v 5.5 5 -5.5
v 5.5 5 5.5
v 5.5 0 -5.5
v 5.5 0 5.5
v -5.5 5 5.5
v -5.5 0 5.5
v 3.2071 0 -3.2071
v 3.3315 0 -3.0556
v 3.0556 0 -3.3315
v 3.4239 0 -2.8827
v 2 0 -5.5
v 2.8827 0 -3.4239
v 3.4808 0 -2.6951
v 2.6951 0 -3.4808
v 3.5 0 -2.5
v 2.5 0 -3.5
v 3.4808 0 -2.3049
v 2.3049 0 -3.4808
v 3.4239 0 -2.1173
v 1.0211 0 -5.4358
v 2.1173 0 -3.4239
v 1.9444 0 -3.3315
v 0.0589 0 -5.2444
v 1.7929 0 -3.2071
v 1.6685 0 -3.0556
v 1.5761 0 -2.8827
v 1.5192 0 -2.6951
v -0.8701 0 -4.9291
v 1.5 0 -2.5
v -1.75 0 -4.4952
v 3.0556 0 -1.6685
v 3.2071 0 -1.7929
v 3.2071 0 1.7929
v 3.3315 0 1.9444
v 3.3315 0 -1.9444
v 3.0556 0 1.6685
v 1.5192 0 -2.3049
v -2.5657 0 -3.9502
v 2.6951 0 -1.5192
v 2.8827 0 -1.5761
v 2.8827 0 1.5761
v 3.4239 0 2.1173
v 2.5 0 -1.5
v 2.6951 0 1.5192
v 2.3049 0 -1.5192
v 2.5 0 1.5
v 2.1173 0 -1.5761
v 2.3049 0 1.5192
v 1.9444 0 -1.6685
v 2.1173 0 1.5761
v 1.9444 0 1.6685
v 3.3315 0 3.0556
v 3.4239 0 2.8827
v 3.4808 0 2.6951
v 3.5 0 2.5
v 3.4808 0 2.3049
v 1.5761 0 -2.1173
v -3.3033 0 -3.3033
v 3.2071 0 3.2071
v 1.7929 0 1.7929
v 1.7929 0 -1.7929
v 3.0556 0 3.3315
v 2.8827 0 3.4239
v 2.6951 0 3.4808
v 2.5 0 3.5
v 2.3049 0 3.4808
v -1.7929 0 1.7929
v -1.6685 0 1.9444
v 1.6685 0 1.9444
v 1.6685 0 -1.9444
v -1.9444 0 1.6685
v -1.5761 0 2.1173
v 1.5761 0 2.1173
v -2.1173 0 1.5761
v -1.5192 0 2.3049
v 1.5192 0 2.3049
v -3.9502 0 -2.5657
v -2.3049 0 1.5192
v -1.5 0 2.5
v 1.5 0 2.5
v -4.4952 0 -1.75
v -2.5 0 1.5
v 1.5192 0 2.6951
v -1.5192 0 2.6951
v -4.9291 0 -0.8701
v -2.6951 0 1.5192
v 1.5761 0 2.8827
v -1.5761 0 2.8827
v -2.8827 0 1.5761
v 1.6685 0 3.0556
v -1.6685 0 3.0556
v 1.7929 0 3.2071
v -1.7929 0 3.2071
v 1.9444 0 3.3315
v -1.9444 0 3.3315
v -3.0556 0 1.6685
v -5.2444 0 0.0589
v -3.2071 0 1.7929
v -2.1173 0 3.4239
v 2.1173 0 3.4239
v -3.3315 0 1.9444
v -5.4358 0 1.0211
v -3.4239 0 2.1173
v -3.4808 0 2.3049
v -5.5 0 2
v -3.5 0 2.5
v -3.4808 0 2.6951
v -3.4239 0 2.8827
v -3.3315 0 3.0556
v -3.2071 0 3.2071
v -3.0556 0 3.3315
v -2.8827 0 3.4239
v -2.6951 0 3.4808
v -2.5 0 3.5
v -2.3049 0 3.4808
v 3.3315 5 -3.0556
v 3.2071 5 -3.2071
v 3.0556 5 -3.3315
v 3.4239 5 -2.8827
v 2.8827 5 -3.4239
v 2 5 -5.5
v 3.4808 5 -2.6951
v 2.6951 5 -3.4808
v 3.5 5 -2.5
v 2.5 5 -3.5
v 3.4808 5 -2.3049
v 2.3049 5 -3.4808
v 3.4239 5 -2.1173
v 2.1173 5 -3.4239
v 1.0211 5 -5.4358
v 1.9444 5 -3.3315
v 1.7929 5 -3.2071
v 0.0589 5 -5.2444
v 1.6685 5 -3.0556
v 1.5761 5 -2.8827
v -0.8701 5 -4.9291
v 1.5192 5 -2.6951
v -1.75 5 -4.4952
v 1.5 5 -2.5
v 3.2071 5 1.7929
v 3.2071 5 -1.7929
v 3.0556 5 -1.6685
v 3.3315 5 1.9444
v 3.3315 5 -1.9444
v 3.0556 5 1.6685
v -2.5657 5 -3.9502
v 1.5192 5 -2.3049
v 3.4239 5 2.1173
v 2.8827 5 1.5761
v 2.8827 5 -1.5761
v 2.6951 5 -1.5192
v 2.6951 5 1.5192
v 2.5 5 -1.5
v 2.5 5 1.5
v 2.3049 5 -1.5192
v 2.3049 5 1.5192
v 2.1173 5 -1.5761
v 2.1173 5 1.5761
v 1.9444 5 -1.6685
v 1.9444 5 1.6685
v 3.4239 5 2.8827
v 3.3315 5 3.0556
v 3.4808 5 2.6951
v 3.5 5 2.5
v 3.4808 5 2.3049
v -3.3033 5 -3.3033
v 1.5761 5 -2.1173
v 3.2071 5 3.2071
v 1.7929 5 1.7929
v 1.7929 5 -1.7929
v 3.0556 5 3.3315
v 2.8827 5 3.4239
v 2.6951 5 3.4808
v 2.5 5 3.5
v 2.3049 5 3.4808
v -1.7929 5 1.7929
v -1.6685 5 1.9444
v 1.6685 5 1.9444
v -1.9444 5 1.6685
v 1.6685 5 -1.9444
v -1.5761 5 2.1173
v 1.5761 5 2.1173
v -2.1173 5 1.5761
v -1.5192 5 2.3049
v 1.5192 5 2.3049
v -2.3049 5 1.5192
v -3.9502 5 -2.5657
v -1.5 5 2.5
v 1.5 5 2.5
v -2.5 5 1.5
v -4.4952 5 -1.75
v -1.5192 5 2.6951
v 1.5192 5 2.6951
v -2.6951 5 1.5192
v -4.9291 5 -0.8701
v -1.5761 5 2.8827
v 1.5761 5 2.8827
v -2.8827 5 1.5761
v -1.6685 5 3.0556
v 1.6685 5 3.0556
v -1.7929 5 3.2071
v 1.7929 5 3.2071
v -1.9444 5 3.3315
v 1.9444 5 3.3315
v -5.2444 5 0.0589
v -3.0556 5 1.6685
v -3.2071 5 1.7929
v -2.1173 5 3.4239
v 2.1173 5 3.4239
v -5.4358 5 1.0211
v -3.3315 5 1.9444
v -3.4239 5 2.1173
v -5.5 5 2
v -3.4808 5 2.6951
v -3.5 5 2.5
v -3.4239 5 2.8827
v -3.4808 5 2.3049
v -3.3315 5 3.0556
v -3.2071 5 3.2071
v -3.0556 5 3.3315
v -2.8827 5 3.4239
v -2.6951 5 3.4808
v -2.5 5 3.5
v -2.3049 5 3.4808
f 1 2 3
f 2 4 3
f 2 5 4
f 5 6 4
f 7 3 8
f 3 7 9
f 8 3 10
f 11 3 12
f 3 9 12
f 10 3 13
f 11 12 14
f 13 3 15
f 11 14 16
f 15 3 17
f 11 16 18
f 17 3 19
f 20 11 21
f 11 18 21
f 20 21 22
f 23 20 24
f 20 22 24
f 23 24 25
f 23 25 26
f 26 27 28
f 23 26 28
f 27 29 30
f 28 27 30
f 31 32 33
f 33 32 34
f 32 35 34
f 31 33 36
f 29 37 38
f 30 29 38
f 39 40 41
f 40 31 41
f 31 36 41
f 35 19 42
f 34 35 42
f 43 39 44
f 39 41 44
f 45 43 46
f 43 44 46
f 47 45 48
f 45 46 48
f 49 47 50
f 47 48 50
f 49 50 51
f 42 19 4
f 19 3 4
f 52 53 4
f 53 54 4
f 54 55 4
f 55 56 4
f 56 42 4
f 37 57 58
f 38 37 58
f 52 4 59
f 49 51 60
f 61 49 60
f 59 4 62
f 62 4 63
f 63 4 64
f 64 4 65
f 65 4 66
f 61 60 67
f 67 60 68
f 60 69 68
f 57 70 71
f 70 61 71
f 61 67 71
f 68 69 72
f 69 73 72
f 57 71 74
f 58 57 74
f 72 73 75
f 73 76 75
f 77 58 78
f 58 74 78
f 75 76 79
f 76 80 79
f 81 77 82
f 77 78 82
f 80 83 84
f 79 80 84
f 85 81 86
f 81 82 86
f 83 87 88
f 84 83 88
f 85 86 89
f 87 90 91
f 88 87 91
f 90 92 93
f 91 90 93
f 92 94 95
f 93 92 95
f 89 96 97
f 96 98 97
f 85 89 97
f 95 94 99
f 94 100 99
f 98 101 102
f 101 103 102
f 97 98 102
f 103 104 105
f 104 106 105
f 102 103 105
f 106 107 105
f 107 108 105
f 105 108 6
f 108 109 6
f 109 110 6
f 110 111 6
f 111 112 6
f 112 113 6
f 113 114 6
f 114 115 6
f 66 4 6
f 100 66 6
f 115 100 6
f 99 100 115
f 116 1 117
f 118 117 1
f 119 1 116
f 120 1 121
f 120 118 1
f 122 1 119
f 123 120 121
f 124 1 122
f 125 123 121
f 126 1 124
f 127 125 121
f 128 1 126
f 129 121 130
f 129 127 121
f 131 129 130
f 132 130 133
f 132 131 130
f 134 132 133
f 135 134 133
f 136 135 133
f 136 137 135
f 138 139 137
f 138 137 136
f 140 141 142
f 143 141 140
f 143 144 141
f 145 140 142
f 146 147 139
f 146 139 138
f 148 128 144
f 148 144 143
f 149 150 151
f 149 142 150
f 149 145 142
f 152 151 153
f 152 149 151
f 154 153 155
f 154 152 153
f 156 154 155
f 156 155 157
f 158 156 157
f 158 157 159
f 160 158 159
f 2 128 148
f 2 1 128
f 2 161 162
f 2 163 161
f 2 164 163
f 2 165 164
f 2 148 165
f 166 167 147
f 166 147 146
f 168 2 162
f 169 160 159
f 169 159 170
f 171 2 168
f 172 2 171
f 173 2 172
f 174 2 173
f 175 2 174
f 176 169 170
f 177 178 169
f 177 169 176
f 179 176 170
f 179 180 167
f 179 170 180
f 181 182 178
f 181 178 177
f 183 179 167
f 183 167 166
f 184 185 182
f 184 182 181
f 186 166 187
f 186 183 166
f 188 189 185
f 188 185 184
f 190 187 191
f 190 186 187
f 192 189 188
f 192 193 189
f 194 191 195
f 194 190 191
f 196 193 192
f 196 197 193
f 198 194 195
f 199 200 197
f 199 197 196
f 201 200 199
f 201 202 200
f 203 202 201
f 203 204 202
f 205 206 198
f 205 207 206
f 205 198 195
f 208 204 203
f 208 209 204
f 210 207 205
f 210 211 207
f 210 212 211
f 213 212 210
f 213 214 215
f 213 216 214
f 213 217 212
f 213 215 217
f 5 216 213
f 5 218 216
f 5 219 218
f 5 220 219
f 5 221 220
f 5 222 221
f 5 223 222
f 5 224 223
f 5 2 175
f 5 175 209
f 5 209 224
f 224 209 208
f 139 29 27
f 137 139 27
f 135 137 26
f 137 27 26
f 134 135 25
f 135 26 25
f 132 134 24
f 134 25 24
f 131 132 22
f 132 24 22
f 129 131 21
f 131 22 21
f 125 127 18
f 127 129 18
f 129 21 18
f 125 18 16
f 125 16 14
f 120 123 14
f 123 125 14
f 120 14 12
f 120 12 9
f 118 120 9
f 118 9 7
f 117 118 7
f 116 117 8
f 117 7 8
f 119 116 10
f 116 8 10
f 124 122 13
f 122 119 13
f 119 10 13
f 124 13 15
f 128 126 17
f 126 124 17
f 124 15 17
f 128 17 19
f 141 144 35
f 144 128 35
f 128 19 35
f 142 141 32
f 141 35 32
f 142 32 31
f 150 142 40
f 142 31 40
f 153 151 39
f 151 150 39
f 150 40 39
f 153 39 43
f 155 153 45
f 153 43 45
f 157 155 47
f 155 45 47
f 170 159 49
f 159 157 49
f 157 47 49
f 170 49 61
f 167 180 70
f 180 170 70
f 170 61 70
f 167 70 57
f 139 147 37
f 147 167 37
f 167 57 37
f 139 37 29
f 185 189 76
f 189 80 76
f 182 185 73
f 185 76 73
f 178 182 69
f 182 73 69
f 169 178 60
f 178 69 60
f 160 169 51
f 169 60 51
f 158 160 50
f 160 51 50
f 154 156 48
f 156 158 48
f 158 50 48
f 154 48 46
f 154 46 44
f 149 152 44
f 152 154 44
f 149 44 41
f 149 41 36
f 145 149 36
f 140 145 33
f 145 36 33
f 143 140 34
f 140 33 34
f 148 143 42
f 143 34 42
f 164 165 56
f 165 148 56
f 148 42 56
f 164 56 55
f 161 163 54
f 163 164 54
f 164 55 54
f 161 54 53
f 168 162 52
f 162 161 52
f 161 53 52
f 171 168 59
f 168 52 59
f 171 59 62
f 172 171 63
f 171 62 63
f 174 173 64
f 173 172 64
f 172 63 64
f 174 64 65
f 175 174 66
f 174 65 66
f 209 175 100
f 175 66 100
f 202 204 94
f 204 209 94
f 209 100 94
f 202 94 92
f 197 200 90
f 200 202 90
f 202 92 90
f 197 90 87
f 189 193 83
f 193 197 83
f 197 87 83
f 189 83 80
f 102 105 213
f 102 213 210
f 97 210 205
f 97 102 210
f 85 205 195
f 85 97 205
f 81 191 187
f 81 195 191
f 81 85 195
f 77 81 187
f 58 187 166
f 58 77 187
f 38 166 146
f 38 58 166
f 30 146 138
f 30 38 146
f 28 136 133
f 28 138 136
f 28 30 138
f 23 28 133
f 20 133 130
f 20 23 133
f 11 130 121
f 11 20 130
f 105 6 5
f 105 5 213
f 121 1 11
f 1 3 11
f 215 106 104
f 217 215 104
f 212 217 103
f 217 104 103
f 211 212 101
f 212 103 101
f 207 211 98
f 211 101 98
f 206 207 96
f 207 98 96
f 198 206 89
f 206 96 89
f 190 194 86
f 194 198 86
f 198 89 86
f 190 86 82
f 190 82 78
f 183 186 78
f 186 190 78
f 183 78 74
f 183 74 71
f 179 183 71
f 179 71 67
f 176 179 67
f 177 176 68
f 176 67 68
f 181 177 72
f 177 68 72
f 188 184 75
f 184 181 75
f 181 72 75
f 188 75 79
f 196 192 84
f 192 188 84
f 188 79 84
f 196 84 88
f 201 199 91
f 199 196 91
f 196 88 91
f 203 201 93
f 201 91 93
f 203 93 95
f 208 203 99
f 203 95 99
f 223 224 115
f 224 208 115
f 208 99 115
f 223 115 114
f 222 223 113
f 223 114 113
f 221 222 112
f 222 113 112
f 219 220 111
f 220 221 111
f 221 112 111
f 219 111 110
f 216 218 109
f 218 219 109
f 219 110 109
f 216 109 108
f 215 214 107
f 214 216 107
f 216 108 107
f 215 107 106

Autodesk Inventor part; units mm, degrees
ref_plane "YZ Plane" through (0, 0, 0) normal (1, 0, 0) x (0, 1, 0)
ref_plane "XZ Plane" through (0, 0, 0) normal (0, 1, 0) x (-1, 0, 0)
ref_plane "XY Plane" through (0, 0, 0) normal (0, 0, 1) x (1, 0, 0)
sketch "Sketch1" plane through (0, 0, 0) normal (0, 1, 0) x (-1, 0, 0)
  line L0 (-5.5, -5.5) -> (-2, -5.5)
  line L1 (5.5, -0.5) -> (5.5, -0.5)
  line L2 (5.5, 5.5) -> (-5.5, 5.5)
  line L3 (-5.5, -0.5) -> (-5.5, -0.5)
  line L4 (-5.5, -5.5) -> (5.5, 5.5) construction
  line L5 (5.5, -5.5) -> (-5.5, 5.5) construction
  circle A0 centre (2.5, 2.5) radius 1
  circle A1 centre (-2.5, 2.5) radius 1
  line L6 (5.5, 5.5) -> (5.5, 2)
  line L7 (-5.5, 5.5) -> (-5.5, -5.5)
  circle A2 centre (-2.5, -2.5) radius 1
  arc A3 (-2, -5.5) -> (5.5, 2) centre (-2, 2) ccw
  point P0 (0, 0)
  dimension "d1" = 11
  dimension "d3" = 2
  dimension "d4" = 2
  dimension "d5" = 3
  dimension "d6" = 3
  dimension "d7" = 3
  dimension "d8" = 3
  dimension "d12" = 11
  dimension "d13" = 2
  dimension "d14" = 3
  dimension "d15" = 3
  dimension "d16" = 7.5
extrude "Extrusion1" add sketch "Sketch1" along normal blind 5
properties part number "link"
